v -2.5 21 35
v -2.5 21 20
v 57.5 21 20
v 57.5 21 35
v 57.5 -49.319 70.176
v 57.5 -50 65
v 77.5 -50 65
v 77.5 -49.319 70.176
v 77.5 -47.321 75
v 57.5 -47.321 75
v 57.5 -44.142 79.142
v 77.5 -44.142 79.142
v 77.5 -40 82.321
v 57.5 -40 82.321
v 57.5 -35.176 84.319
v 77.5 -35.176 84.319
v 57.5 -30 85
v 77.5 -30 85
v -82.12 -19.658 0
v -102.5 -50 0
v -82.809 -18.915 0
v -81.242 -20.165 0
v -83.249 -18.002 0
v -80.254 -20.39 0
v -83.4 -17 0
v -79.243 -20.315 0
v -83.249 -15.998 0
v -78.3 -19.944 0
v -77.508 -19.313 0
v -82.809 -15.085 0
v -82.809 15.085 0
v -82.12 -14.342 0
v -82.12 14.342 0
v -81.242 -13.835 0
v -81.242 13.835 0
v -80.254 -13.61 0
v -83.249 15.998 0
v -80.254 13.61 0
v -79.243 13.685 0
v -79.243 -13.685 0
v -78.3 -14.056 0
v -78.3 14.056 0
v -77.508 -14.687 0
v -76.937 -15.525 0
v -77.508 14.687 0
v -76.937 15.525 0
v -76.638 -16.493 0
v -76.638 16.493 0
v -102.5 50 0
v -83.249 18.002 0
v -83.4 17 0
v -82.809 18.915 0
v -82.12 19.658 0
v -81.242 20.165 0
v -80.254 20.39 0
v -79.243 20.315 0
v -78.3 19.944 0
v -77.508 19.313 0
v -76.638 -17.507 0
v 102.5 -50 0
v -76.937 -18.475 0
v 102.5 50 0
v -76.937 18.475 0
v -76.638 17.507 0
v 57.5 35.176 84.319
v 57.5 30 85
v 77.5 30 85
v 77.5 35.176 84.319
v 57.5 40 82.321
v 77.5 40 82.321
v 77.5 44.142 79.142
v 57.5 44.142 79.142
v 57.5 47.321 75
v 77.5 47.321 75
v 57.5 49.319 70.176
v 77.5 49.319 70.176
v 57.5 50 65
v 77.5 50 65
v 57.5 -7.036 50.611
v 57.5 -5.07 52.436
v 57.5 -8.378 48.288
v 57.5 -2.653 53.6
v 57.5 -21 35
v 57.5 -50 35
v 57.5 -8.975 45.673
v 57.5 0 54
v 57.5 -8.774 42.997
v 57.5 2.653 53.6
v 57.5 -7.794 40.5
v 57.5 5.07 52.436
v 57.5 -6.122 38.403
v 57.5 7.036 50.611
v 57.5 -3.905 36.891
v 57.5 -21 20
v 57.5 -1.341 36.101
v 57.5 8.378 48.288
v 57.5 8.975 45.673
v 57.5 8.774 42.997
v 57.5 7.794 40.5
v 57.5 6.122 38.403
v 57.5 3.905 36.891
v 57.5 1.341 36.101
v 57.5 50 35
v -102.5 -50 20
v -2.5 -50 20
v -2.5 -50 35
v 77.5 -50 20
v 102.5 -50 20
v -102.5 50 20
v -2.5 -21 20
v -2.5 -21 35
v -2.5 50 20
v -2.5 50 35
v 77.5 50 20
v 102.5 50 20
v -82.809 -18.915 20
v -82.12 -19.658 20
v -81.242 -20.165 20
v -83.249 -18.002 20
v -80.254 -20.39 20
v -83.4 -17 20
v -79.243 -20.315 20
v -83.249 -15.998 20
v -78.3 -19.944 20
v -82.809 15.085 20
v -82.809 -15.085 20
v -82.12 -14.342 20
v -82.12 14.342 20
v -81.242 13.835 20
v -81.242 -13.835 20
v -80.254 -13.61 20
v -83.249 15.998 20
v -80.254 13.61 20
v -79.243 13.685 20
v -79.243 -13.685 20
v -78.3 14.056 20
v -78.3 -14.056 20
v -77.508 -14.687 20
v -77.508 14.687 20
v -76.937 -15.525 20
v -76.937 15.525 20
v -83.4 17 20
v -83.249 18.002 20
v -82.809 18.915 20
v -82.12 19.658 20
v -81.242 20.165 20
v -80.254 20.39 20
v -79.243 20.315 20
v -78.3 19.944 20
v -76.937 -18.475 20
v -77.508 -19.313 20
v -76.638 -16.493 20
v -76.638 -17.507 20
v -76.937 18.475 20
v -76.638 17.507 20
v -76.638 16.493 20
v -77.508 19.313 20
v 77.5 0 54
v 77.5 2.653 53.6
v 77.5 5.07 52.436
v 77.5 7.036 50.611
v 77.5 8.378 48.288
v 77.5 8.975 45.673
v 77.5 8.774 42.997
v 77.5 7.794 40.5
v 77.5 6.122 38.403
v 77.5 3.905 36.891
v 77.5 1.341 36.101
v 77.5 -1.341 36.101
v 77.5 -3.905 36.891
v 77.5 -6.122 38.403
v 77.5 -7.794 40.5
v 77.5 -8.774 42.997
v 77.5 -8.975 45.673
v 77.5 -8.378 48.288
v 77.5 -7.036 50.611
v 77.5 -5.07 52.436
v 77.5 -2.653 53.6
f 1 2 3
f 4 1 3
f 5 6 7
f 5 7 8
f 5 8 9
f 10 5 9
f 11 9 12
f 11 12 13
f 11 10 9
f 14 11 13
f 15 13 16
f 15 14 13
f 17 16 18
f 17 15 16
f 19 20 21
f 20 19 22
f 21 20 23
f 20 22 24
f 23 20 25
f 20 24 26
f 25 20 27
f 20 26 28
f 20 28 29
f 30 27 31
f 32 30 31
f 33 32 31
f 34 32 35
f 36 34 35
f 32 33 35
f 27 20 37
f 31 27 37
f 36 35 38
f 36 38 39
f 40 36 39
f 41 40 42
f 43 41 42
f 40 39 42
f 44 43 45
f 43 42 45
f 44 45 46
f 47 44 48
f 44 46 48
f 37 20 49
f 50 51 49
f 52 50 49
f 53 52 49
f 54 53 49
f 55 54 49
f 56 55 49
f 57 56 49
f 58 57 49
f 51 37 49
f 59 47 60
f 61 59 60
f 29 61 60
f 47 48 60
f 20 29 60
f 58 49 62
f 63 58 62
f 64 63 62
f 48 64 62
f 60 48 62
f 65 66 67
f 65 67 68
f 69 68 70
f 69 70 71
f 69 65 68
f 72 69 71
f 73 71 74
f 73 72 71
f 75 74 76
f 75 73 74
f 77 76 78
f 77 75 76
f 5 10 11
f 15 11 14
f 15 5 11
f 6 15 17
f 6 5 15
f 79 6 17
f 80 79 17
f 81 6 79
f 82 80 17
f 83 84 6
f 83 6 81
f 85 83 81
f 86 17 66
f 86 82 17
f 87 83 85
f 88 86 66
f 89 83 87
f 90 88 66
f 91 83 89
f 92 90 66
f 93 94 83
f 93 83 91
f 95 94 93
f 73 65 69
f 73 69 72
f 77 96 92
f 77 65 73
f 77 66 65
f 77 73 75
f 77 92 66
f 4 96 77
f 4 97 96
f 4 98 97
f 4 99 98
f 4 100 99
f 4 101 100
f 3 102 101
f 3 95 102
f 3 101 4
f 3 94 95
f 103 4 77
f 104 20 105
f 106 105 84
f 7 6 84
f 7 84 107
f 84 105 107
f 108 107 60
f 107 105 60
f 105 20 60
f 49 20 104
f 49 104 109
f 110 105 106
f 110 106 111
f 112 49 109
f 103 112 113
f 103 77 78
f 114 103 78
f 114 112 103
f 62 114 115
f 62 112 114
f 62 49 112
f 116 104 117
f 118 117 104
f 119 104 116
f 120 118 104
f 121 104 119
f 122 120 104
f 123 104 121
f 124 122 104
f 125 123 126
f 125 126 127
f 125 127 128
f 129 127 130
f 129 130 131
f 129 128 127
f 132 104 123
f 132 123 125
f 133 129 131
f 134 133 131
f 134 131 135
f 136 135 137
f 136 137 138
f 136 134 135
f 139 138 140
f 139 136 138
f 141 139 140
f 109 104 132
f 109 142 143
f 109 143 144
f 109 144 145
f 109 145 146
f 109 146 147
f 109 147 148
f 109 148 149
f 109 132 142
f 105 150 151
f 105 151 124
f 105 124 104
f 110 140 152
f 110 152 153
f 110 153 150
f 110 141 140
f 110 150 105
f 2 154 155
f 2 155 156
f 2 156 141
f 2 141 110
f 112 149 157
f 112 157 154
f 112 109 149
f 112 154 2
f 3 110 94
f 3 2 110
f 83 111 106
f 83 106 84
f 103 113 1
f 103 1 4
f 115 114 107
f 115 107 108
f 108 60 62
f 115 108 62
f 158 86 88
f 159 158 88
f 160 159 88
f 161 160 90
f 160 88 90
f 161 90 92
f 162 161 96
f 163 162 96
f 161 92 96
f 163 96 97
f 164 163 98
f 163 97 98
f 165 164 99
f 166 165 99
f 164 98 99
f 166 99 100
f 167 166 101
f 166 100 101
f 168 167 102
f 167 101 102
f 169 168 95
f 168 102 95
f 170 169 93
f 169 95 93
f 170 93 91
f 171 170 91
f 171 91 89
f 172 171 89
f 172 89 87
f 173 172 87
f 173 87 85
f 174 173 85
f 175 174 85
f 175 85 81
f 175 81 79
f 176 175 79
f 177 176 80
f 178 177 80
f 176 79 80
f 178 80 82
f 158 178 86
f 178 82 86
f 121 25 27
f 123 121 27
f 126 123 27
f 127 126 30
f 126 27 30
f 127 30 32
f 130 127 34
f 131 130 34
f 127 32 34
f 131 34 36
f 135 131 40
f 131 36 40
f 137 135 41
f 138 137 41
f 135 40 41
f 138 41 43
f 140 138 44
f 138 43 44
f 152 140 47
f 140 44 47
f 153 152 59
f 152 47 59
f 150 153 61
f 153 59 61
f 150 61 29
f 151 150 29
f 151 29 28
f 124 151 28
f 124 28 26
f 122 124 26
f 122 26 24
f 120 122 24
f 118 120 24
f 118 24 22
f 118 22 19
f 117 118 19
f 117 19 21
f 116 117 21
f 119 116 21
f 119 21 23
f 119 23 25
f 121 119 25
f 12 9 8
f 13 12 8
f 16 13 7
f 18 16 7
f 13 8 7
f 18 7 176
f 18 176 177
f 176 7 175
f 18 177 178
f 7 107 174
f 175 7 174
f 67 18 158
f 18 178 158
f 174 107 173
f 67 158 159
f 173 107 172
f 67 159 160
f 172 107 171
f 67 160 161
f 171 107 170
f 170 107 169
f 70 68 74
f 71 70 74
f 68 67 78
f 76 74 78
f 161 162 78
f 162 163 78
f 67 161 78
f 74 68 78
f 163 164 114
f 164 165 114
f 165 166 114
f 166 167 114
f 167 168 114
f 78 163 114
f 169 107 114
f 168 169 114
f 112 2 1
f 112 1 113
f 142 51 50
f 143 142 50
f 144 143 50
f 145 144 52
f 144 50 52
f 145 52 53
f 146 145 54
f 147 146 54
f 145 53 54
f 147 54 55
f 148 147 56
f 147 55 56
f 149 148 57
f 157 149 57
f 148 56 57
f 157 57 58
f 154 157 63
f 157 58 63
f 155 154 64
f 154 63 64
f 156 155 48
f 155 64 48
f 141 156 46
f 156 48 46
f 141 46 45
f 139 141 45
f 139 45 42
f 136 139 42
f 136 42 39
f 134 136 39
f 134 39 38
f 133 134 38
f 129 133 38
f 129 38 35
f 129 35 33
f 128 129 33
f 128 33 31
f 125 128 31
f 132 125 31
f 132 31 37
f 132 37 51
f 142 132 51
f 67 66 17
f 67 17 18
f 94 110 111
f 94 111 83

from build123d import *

# Parameters (mm, degrees)
SCHIZZO1_W                   = 205
SCHIZZO1_H                   = 100
ESTRUSIONE_ESTRUSIONE1_DEPTH = 20
SCHIZZO2_W                   = 20
SCHIZZO2_H                   = 100
ESTRUSIONE_ESTRUSIONE2_DEPTH = 65
TAGLIO_ESTRUSIONE1_DEPTH     = 20
SCHIZZO4_R                   = 9
TAGLIO_ESTRUSIONE2_DEPTH     = 20
SCHIZZO5_W                   = 60
SCHIZZO5_H                   = 29
ESTRUSIONE_ESTRUSIONE3_DEPTH = 15
FORO_FILETTATO_M8_1_D        = 6.8


with BuildPart() as part:
    # Schizzo1 → Estrusione-Estrusione1 (new body)
    with BuildSketch(Plane.XY):
        Rectangle(SCHIZZO1_W, SCHIZZO1_H)
    extrude(amount=ESTRUSIONE_ESTRUSIONE1_DEPTH)

    # Schizzo2 → Estrusione-Estrusione2 (add)
    with BuildSketch(Plane.XY.offset(20)):
        with Locations((67.5, 0)):
            Rectangle(SCHIZZO2_W, SCHIZZO2_H)
    extrude(amount=ESTRUSIONE_ESTRUSIONE2_DEPTH)

    # Schizzo3 → Taglio-Estrusione1 (cut)
    with BuildSketch(Plane.ZY.offset(-57.5)):
        with BuildLine():
            Line((65, 50), (85, 50))
            Line((85, 50), (85, 30))
            ThreePointArc((85, 30), (79.142135624, 44.142135624), (65, 50))
        make_face()
        with BuildLine():
            Line((85, -30), (85, -50))
            Line((85, -50), (65, -50))
            ThreePointArc((65, -50), (79.142135624, -44.142135624), (85, -30))
        make_face()
    extrude(amount=-TAGLIO_ESTRUSIONE1_DEPTH, mode=Mode.SUBTRACT)

    # Schizzo4 → Taglio-Estrusione2 (cut)
    with BuildSketch(Plane.ZY.offset(-57.5)):
        with Locations((45, 0)):
            Circle(SCHIZZO4_R)
    extrude(amount=-TAGLIO_ESTRUSIONE2_DEPTH, mode=Mode.SUBTRACT)

    # Schizzo5 → Estrusione-Estrusione3 (add)
    with BuildSketch(Plane.XY.offset(20)):
        with Locations((27.5, -35.5)):
            Rectangle(SCHIZZO5_W, SCHIZZO5_H)
        with Locations((27.5, 35.5)):
            Rectangle(SCHIZZO5_W, SCHIZZO5_H)
    extrude(amount=ESTRUSIONE_ESTRUSIONE3_DEPTH)

    # Foro filettato M8-1 (through all)
    with Locations(Plane(origin=(-80, 17, 20), x_dir=(1, 0, 0), z_dir=(0, 0, 1))):
        with Locations((0, 0), (0, -34)):
            Hole(FORO_FILETTATO_M8_1_D / 2)


solid = part.part
